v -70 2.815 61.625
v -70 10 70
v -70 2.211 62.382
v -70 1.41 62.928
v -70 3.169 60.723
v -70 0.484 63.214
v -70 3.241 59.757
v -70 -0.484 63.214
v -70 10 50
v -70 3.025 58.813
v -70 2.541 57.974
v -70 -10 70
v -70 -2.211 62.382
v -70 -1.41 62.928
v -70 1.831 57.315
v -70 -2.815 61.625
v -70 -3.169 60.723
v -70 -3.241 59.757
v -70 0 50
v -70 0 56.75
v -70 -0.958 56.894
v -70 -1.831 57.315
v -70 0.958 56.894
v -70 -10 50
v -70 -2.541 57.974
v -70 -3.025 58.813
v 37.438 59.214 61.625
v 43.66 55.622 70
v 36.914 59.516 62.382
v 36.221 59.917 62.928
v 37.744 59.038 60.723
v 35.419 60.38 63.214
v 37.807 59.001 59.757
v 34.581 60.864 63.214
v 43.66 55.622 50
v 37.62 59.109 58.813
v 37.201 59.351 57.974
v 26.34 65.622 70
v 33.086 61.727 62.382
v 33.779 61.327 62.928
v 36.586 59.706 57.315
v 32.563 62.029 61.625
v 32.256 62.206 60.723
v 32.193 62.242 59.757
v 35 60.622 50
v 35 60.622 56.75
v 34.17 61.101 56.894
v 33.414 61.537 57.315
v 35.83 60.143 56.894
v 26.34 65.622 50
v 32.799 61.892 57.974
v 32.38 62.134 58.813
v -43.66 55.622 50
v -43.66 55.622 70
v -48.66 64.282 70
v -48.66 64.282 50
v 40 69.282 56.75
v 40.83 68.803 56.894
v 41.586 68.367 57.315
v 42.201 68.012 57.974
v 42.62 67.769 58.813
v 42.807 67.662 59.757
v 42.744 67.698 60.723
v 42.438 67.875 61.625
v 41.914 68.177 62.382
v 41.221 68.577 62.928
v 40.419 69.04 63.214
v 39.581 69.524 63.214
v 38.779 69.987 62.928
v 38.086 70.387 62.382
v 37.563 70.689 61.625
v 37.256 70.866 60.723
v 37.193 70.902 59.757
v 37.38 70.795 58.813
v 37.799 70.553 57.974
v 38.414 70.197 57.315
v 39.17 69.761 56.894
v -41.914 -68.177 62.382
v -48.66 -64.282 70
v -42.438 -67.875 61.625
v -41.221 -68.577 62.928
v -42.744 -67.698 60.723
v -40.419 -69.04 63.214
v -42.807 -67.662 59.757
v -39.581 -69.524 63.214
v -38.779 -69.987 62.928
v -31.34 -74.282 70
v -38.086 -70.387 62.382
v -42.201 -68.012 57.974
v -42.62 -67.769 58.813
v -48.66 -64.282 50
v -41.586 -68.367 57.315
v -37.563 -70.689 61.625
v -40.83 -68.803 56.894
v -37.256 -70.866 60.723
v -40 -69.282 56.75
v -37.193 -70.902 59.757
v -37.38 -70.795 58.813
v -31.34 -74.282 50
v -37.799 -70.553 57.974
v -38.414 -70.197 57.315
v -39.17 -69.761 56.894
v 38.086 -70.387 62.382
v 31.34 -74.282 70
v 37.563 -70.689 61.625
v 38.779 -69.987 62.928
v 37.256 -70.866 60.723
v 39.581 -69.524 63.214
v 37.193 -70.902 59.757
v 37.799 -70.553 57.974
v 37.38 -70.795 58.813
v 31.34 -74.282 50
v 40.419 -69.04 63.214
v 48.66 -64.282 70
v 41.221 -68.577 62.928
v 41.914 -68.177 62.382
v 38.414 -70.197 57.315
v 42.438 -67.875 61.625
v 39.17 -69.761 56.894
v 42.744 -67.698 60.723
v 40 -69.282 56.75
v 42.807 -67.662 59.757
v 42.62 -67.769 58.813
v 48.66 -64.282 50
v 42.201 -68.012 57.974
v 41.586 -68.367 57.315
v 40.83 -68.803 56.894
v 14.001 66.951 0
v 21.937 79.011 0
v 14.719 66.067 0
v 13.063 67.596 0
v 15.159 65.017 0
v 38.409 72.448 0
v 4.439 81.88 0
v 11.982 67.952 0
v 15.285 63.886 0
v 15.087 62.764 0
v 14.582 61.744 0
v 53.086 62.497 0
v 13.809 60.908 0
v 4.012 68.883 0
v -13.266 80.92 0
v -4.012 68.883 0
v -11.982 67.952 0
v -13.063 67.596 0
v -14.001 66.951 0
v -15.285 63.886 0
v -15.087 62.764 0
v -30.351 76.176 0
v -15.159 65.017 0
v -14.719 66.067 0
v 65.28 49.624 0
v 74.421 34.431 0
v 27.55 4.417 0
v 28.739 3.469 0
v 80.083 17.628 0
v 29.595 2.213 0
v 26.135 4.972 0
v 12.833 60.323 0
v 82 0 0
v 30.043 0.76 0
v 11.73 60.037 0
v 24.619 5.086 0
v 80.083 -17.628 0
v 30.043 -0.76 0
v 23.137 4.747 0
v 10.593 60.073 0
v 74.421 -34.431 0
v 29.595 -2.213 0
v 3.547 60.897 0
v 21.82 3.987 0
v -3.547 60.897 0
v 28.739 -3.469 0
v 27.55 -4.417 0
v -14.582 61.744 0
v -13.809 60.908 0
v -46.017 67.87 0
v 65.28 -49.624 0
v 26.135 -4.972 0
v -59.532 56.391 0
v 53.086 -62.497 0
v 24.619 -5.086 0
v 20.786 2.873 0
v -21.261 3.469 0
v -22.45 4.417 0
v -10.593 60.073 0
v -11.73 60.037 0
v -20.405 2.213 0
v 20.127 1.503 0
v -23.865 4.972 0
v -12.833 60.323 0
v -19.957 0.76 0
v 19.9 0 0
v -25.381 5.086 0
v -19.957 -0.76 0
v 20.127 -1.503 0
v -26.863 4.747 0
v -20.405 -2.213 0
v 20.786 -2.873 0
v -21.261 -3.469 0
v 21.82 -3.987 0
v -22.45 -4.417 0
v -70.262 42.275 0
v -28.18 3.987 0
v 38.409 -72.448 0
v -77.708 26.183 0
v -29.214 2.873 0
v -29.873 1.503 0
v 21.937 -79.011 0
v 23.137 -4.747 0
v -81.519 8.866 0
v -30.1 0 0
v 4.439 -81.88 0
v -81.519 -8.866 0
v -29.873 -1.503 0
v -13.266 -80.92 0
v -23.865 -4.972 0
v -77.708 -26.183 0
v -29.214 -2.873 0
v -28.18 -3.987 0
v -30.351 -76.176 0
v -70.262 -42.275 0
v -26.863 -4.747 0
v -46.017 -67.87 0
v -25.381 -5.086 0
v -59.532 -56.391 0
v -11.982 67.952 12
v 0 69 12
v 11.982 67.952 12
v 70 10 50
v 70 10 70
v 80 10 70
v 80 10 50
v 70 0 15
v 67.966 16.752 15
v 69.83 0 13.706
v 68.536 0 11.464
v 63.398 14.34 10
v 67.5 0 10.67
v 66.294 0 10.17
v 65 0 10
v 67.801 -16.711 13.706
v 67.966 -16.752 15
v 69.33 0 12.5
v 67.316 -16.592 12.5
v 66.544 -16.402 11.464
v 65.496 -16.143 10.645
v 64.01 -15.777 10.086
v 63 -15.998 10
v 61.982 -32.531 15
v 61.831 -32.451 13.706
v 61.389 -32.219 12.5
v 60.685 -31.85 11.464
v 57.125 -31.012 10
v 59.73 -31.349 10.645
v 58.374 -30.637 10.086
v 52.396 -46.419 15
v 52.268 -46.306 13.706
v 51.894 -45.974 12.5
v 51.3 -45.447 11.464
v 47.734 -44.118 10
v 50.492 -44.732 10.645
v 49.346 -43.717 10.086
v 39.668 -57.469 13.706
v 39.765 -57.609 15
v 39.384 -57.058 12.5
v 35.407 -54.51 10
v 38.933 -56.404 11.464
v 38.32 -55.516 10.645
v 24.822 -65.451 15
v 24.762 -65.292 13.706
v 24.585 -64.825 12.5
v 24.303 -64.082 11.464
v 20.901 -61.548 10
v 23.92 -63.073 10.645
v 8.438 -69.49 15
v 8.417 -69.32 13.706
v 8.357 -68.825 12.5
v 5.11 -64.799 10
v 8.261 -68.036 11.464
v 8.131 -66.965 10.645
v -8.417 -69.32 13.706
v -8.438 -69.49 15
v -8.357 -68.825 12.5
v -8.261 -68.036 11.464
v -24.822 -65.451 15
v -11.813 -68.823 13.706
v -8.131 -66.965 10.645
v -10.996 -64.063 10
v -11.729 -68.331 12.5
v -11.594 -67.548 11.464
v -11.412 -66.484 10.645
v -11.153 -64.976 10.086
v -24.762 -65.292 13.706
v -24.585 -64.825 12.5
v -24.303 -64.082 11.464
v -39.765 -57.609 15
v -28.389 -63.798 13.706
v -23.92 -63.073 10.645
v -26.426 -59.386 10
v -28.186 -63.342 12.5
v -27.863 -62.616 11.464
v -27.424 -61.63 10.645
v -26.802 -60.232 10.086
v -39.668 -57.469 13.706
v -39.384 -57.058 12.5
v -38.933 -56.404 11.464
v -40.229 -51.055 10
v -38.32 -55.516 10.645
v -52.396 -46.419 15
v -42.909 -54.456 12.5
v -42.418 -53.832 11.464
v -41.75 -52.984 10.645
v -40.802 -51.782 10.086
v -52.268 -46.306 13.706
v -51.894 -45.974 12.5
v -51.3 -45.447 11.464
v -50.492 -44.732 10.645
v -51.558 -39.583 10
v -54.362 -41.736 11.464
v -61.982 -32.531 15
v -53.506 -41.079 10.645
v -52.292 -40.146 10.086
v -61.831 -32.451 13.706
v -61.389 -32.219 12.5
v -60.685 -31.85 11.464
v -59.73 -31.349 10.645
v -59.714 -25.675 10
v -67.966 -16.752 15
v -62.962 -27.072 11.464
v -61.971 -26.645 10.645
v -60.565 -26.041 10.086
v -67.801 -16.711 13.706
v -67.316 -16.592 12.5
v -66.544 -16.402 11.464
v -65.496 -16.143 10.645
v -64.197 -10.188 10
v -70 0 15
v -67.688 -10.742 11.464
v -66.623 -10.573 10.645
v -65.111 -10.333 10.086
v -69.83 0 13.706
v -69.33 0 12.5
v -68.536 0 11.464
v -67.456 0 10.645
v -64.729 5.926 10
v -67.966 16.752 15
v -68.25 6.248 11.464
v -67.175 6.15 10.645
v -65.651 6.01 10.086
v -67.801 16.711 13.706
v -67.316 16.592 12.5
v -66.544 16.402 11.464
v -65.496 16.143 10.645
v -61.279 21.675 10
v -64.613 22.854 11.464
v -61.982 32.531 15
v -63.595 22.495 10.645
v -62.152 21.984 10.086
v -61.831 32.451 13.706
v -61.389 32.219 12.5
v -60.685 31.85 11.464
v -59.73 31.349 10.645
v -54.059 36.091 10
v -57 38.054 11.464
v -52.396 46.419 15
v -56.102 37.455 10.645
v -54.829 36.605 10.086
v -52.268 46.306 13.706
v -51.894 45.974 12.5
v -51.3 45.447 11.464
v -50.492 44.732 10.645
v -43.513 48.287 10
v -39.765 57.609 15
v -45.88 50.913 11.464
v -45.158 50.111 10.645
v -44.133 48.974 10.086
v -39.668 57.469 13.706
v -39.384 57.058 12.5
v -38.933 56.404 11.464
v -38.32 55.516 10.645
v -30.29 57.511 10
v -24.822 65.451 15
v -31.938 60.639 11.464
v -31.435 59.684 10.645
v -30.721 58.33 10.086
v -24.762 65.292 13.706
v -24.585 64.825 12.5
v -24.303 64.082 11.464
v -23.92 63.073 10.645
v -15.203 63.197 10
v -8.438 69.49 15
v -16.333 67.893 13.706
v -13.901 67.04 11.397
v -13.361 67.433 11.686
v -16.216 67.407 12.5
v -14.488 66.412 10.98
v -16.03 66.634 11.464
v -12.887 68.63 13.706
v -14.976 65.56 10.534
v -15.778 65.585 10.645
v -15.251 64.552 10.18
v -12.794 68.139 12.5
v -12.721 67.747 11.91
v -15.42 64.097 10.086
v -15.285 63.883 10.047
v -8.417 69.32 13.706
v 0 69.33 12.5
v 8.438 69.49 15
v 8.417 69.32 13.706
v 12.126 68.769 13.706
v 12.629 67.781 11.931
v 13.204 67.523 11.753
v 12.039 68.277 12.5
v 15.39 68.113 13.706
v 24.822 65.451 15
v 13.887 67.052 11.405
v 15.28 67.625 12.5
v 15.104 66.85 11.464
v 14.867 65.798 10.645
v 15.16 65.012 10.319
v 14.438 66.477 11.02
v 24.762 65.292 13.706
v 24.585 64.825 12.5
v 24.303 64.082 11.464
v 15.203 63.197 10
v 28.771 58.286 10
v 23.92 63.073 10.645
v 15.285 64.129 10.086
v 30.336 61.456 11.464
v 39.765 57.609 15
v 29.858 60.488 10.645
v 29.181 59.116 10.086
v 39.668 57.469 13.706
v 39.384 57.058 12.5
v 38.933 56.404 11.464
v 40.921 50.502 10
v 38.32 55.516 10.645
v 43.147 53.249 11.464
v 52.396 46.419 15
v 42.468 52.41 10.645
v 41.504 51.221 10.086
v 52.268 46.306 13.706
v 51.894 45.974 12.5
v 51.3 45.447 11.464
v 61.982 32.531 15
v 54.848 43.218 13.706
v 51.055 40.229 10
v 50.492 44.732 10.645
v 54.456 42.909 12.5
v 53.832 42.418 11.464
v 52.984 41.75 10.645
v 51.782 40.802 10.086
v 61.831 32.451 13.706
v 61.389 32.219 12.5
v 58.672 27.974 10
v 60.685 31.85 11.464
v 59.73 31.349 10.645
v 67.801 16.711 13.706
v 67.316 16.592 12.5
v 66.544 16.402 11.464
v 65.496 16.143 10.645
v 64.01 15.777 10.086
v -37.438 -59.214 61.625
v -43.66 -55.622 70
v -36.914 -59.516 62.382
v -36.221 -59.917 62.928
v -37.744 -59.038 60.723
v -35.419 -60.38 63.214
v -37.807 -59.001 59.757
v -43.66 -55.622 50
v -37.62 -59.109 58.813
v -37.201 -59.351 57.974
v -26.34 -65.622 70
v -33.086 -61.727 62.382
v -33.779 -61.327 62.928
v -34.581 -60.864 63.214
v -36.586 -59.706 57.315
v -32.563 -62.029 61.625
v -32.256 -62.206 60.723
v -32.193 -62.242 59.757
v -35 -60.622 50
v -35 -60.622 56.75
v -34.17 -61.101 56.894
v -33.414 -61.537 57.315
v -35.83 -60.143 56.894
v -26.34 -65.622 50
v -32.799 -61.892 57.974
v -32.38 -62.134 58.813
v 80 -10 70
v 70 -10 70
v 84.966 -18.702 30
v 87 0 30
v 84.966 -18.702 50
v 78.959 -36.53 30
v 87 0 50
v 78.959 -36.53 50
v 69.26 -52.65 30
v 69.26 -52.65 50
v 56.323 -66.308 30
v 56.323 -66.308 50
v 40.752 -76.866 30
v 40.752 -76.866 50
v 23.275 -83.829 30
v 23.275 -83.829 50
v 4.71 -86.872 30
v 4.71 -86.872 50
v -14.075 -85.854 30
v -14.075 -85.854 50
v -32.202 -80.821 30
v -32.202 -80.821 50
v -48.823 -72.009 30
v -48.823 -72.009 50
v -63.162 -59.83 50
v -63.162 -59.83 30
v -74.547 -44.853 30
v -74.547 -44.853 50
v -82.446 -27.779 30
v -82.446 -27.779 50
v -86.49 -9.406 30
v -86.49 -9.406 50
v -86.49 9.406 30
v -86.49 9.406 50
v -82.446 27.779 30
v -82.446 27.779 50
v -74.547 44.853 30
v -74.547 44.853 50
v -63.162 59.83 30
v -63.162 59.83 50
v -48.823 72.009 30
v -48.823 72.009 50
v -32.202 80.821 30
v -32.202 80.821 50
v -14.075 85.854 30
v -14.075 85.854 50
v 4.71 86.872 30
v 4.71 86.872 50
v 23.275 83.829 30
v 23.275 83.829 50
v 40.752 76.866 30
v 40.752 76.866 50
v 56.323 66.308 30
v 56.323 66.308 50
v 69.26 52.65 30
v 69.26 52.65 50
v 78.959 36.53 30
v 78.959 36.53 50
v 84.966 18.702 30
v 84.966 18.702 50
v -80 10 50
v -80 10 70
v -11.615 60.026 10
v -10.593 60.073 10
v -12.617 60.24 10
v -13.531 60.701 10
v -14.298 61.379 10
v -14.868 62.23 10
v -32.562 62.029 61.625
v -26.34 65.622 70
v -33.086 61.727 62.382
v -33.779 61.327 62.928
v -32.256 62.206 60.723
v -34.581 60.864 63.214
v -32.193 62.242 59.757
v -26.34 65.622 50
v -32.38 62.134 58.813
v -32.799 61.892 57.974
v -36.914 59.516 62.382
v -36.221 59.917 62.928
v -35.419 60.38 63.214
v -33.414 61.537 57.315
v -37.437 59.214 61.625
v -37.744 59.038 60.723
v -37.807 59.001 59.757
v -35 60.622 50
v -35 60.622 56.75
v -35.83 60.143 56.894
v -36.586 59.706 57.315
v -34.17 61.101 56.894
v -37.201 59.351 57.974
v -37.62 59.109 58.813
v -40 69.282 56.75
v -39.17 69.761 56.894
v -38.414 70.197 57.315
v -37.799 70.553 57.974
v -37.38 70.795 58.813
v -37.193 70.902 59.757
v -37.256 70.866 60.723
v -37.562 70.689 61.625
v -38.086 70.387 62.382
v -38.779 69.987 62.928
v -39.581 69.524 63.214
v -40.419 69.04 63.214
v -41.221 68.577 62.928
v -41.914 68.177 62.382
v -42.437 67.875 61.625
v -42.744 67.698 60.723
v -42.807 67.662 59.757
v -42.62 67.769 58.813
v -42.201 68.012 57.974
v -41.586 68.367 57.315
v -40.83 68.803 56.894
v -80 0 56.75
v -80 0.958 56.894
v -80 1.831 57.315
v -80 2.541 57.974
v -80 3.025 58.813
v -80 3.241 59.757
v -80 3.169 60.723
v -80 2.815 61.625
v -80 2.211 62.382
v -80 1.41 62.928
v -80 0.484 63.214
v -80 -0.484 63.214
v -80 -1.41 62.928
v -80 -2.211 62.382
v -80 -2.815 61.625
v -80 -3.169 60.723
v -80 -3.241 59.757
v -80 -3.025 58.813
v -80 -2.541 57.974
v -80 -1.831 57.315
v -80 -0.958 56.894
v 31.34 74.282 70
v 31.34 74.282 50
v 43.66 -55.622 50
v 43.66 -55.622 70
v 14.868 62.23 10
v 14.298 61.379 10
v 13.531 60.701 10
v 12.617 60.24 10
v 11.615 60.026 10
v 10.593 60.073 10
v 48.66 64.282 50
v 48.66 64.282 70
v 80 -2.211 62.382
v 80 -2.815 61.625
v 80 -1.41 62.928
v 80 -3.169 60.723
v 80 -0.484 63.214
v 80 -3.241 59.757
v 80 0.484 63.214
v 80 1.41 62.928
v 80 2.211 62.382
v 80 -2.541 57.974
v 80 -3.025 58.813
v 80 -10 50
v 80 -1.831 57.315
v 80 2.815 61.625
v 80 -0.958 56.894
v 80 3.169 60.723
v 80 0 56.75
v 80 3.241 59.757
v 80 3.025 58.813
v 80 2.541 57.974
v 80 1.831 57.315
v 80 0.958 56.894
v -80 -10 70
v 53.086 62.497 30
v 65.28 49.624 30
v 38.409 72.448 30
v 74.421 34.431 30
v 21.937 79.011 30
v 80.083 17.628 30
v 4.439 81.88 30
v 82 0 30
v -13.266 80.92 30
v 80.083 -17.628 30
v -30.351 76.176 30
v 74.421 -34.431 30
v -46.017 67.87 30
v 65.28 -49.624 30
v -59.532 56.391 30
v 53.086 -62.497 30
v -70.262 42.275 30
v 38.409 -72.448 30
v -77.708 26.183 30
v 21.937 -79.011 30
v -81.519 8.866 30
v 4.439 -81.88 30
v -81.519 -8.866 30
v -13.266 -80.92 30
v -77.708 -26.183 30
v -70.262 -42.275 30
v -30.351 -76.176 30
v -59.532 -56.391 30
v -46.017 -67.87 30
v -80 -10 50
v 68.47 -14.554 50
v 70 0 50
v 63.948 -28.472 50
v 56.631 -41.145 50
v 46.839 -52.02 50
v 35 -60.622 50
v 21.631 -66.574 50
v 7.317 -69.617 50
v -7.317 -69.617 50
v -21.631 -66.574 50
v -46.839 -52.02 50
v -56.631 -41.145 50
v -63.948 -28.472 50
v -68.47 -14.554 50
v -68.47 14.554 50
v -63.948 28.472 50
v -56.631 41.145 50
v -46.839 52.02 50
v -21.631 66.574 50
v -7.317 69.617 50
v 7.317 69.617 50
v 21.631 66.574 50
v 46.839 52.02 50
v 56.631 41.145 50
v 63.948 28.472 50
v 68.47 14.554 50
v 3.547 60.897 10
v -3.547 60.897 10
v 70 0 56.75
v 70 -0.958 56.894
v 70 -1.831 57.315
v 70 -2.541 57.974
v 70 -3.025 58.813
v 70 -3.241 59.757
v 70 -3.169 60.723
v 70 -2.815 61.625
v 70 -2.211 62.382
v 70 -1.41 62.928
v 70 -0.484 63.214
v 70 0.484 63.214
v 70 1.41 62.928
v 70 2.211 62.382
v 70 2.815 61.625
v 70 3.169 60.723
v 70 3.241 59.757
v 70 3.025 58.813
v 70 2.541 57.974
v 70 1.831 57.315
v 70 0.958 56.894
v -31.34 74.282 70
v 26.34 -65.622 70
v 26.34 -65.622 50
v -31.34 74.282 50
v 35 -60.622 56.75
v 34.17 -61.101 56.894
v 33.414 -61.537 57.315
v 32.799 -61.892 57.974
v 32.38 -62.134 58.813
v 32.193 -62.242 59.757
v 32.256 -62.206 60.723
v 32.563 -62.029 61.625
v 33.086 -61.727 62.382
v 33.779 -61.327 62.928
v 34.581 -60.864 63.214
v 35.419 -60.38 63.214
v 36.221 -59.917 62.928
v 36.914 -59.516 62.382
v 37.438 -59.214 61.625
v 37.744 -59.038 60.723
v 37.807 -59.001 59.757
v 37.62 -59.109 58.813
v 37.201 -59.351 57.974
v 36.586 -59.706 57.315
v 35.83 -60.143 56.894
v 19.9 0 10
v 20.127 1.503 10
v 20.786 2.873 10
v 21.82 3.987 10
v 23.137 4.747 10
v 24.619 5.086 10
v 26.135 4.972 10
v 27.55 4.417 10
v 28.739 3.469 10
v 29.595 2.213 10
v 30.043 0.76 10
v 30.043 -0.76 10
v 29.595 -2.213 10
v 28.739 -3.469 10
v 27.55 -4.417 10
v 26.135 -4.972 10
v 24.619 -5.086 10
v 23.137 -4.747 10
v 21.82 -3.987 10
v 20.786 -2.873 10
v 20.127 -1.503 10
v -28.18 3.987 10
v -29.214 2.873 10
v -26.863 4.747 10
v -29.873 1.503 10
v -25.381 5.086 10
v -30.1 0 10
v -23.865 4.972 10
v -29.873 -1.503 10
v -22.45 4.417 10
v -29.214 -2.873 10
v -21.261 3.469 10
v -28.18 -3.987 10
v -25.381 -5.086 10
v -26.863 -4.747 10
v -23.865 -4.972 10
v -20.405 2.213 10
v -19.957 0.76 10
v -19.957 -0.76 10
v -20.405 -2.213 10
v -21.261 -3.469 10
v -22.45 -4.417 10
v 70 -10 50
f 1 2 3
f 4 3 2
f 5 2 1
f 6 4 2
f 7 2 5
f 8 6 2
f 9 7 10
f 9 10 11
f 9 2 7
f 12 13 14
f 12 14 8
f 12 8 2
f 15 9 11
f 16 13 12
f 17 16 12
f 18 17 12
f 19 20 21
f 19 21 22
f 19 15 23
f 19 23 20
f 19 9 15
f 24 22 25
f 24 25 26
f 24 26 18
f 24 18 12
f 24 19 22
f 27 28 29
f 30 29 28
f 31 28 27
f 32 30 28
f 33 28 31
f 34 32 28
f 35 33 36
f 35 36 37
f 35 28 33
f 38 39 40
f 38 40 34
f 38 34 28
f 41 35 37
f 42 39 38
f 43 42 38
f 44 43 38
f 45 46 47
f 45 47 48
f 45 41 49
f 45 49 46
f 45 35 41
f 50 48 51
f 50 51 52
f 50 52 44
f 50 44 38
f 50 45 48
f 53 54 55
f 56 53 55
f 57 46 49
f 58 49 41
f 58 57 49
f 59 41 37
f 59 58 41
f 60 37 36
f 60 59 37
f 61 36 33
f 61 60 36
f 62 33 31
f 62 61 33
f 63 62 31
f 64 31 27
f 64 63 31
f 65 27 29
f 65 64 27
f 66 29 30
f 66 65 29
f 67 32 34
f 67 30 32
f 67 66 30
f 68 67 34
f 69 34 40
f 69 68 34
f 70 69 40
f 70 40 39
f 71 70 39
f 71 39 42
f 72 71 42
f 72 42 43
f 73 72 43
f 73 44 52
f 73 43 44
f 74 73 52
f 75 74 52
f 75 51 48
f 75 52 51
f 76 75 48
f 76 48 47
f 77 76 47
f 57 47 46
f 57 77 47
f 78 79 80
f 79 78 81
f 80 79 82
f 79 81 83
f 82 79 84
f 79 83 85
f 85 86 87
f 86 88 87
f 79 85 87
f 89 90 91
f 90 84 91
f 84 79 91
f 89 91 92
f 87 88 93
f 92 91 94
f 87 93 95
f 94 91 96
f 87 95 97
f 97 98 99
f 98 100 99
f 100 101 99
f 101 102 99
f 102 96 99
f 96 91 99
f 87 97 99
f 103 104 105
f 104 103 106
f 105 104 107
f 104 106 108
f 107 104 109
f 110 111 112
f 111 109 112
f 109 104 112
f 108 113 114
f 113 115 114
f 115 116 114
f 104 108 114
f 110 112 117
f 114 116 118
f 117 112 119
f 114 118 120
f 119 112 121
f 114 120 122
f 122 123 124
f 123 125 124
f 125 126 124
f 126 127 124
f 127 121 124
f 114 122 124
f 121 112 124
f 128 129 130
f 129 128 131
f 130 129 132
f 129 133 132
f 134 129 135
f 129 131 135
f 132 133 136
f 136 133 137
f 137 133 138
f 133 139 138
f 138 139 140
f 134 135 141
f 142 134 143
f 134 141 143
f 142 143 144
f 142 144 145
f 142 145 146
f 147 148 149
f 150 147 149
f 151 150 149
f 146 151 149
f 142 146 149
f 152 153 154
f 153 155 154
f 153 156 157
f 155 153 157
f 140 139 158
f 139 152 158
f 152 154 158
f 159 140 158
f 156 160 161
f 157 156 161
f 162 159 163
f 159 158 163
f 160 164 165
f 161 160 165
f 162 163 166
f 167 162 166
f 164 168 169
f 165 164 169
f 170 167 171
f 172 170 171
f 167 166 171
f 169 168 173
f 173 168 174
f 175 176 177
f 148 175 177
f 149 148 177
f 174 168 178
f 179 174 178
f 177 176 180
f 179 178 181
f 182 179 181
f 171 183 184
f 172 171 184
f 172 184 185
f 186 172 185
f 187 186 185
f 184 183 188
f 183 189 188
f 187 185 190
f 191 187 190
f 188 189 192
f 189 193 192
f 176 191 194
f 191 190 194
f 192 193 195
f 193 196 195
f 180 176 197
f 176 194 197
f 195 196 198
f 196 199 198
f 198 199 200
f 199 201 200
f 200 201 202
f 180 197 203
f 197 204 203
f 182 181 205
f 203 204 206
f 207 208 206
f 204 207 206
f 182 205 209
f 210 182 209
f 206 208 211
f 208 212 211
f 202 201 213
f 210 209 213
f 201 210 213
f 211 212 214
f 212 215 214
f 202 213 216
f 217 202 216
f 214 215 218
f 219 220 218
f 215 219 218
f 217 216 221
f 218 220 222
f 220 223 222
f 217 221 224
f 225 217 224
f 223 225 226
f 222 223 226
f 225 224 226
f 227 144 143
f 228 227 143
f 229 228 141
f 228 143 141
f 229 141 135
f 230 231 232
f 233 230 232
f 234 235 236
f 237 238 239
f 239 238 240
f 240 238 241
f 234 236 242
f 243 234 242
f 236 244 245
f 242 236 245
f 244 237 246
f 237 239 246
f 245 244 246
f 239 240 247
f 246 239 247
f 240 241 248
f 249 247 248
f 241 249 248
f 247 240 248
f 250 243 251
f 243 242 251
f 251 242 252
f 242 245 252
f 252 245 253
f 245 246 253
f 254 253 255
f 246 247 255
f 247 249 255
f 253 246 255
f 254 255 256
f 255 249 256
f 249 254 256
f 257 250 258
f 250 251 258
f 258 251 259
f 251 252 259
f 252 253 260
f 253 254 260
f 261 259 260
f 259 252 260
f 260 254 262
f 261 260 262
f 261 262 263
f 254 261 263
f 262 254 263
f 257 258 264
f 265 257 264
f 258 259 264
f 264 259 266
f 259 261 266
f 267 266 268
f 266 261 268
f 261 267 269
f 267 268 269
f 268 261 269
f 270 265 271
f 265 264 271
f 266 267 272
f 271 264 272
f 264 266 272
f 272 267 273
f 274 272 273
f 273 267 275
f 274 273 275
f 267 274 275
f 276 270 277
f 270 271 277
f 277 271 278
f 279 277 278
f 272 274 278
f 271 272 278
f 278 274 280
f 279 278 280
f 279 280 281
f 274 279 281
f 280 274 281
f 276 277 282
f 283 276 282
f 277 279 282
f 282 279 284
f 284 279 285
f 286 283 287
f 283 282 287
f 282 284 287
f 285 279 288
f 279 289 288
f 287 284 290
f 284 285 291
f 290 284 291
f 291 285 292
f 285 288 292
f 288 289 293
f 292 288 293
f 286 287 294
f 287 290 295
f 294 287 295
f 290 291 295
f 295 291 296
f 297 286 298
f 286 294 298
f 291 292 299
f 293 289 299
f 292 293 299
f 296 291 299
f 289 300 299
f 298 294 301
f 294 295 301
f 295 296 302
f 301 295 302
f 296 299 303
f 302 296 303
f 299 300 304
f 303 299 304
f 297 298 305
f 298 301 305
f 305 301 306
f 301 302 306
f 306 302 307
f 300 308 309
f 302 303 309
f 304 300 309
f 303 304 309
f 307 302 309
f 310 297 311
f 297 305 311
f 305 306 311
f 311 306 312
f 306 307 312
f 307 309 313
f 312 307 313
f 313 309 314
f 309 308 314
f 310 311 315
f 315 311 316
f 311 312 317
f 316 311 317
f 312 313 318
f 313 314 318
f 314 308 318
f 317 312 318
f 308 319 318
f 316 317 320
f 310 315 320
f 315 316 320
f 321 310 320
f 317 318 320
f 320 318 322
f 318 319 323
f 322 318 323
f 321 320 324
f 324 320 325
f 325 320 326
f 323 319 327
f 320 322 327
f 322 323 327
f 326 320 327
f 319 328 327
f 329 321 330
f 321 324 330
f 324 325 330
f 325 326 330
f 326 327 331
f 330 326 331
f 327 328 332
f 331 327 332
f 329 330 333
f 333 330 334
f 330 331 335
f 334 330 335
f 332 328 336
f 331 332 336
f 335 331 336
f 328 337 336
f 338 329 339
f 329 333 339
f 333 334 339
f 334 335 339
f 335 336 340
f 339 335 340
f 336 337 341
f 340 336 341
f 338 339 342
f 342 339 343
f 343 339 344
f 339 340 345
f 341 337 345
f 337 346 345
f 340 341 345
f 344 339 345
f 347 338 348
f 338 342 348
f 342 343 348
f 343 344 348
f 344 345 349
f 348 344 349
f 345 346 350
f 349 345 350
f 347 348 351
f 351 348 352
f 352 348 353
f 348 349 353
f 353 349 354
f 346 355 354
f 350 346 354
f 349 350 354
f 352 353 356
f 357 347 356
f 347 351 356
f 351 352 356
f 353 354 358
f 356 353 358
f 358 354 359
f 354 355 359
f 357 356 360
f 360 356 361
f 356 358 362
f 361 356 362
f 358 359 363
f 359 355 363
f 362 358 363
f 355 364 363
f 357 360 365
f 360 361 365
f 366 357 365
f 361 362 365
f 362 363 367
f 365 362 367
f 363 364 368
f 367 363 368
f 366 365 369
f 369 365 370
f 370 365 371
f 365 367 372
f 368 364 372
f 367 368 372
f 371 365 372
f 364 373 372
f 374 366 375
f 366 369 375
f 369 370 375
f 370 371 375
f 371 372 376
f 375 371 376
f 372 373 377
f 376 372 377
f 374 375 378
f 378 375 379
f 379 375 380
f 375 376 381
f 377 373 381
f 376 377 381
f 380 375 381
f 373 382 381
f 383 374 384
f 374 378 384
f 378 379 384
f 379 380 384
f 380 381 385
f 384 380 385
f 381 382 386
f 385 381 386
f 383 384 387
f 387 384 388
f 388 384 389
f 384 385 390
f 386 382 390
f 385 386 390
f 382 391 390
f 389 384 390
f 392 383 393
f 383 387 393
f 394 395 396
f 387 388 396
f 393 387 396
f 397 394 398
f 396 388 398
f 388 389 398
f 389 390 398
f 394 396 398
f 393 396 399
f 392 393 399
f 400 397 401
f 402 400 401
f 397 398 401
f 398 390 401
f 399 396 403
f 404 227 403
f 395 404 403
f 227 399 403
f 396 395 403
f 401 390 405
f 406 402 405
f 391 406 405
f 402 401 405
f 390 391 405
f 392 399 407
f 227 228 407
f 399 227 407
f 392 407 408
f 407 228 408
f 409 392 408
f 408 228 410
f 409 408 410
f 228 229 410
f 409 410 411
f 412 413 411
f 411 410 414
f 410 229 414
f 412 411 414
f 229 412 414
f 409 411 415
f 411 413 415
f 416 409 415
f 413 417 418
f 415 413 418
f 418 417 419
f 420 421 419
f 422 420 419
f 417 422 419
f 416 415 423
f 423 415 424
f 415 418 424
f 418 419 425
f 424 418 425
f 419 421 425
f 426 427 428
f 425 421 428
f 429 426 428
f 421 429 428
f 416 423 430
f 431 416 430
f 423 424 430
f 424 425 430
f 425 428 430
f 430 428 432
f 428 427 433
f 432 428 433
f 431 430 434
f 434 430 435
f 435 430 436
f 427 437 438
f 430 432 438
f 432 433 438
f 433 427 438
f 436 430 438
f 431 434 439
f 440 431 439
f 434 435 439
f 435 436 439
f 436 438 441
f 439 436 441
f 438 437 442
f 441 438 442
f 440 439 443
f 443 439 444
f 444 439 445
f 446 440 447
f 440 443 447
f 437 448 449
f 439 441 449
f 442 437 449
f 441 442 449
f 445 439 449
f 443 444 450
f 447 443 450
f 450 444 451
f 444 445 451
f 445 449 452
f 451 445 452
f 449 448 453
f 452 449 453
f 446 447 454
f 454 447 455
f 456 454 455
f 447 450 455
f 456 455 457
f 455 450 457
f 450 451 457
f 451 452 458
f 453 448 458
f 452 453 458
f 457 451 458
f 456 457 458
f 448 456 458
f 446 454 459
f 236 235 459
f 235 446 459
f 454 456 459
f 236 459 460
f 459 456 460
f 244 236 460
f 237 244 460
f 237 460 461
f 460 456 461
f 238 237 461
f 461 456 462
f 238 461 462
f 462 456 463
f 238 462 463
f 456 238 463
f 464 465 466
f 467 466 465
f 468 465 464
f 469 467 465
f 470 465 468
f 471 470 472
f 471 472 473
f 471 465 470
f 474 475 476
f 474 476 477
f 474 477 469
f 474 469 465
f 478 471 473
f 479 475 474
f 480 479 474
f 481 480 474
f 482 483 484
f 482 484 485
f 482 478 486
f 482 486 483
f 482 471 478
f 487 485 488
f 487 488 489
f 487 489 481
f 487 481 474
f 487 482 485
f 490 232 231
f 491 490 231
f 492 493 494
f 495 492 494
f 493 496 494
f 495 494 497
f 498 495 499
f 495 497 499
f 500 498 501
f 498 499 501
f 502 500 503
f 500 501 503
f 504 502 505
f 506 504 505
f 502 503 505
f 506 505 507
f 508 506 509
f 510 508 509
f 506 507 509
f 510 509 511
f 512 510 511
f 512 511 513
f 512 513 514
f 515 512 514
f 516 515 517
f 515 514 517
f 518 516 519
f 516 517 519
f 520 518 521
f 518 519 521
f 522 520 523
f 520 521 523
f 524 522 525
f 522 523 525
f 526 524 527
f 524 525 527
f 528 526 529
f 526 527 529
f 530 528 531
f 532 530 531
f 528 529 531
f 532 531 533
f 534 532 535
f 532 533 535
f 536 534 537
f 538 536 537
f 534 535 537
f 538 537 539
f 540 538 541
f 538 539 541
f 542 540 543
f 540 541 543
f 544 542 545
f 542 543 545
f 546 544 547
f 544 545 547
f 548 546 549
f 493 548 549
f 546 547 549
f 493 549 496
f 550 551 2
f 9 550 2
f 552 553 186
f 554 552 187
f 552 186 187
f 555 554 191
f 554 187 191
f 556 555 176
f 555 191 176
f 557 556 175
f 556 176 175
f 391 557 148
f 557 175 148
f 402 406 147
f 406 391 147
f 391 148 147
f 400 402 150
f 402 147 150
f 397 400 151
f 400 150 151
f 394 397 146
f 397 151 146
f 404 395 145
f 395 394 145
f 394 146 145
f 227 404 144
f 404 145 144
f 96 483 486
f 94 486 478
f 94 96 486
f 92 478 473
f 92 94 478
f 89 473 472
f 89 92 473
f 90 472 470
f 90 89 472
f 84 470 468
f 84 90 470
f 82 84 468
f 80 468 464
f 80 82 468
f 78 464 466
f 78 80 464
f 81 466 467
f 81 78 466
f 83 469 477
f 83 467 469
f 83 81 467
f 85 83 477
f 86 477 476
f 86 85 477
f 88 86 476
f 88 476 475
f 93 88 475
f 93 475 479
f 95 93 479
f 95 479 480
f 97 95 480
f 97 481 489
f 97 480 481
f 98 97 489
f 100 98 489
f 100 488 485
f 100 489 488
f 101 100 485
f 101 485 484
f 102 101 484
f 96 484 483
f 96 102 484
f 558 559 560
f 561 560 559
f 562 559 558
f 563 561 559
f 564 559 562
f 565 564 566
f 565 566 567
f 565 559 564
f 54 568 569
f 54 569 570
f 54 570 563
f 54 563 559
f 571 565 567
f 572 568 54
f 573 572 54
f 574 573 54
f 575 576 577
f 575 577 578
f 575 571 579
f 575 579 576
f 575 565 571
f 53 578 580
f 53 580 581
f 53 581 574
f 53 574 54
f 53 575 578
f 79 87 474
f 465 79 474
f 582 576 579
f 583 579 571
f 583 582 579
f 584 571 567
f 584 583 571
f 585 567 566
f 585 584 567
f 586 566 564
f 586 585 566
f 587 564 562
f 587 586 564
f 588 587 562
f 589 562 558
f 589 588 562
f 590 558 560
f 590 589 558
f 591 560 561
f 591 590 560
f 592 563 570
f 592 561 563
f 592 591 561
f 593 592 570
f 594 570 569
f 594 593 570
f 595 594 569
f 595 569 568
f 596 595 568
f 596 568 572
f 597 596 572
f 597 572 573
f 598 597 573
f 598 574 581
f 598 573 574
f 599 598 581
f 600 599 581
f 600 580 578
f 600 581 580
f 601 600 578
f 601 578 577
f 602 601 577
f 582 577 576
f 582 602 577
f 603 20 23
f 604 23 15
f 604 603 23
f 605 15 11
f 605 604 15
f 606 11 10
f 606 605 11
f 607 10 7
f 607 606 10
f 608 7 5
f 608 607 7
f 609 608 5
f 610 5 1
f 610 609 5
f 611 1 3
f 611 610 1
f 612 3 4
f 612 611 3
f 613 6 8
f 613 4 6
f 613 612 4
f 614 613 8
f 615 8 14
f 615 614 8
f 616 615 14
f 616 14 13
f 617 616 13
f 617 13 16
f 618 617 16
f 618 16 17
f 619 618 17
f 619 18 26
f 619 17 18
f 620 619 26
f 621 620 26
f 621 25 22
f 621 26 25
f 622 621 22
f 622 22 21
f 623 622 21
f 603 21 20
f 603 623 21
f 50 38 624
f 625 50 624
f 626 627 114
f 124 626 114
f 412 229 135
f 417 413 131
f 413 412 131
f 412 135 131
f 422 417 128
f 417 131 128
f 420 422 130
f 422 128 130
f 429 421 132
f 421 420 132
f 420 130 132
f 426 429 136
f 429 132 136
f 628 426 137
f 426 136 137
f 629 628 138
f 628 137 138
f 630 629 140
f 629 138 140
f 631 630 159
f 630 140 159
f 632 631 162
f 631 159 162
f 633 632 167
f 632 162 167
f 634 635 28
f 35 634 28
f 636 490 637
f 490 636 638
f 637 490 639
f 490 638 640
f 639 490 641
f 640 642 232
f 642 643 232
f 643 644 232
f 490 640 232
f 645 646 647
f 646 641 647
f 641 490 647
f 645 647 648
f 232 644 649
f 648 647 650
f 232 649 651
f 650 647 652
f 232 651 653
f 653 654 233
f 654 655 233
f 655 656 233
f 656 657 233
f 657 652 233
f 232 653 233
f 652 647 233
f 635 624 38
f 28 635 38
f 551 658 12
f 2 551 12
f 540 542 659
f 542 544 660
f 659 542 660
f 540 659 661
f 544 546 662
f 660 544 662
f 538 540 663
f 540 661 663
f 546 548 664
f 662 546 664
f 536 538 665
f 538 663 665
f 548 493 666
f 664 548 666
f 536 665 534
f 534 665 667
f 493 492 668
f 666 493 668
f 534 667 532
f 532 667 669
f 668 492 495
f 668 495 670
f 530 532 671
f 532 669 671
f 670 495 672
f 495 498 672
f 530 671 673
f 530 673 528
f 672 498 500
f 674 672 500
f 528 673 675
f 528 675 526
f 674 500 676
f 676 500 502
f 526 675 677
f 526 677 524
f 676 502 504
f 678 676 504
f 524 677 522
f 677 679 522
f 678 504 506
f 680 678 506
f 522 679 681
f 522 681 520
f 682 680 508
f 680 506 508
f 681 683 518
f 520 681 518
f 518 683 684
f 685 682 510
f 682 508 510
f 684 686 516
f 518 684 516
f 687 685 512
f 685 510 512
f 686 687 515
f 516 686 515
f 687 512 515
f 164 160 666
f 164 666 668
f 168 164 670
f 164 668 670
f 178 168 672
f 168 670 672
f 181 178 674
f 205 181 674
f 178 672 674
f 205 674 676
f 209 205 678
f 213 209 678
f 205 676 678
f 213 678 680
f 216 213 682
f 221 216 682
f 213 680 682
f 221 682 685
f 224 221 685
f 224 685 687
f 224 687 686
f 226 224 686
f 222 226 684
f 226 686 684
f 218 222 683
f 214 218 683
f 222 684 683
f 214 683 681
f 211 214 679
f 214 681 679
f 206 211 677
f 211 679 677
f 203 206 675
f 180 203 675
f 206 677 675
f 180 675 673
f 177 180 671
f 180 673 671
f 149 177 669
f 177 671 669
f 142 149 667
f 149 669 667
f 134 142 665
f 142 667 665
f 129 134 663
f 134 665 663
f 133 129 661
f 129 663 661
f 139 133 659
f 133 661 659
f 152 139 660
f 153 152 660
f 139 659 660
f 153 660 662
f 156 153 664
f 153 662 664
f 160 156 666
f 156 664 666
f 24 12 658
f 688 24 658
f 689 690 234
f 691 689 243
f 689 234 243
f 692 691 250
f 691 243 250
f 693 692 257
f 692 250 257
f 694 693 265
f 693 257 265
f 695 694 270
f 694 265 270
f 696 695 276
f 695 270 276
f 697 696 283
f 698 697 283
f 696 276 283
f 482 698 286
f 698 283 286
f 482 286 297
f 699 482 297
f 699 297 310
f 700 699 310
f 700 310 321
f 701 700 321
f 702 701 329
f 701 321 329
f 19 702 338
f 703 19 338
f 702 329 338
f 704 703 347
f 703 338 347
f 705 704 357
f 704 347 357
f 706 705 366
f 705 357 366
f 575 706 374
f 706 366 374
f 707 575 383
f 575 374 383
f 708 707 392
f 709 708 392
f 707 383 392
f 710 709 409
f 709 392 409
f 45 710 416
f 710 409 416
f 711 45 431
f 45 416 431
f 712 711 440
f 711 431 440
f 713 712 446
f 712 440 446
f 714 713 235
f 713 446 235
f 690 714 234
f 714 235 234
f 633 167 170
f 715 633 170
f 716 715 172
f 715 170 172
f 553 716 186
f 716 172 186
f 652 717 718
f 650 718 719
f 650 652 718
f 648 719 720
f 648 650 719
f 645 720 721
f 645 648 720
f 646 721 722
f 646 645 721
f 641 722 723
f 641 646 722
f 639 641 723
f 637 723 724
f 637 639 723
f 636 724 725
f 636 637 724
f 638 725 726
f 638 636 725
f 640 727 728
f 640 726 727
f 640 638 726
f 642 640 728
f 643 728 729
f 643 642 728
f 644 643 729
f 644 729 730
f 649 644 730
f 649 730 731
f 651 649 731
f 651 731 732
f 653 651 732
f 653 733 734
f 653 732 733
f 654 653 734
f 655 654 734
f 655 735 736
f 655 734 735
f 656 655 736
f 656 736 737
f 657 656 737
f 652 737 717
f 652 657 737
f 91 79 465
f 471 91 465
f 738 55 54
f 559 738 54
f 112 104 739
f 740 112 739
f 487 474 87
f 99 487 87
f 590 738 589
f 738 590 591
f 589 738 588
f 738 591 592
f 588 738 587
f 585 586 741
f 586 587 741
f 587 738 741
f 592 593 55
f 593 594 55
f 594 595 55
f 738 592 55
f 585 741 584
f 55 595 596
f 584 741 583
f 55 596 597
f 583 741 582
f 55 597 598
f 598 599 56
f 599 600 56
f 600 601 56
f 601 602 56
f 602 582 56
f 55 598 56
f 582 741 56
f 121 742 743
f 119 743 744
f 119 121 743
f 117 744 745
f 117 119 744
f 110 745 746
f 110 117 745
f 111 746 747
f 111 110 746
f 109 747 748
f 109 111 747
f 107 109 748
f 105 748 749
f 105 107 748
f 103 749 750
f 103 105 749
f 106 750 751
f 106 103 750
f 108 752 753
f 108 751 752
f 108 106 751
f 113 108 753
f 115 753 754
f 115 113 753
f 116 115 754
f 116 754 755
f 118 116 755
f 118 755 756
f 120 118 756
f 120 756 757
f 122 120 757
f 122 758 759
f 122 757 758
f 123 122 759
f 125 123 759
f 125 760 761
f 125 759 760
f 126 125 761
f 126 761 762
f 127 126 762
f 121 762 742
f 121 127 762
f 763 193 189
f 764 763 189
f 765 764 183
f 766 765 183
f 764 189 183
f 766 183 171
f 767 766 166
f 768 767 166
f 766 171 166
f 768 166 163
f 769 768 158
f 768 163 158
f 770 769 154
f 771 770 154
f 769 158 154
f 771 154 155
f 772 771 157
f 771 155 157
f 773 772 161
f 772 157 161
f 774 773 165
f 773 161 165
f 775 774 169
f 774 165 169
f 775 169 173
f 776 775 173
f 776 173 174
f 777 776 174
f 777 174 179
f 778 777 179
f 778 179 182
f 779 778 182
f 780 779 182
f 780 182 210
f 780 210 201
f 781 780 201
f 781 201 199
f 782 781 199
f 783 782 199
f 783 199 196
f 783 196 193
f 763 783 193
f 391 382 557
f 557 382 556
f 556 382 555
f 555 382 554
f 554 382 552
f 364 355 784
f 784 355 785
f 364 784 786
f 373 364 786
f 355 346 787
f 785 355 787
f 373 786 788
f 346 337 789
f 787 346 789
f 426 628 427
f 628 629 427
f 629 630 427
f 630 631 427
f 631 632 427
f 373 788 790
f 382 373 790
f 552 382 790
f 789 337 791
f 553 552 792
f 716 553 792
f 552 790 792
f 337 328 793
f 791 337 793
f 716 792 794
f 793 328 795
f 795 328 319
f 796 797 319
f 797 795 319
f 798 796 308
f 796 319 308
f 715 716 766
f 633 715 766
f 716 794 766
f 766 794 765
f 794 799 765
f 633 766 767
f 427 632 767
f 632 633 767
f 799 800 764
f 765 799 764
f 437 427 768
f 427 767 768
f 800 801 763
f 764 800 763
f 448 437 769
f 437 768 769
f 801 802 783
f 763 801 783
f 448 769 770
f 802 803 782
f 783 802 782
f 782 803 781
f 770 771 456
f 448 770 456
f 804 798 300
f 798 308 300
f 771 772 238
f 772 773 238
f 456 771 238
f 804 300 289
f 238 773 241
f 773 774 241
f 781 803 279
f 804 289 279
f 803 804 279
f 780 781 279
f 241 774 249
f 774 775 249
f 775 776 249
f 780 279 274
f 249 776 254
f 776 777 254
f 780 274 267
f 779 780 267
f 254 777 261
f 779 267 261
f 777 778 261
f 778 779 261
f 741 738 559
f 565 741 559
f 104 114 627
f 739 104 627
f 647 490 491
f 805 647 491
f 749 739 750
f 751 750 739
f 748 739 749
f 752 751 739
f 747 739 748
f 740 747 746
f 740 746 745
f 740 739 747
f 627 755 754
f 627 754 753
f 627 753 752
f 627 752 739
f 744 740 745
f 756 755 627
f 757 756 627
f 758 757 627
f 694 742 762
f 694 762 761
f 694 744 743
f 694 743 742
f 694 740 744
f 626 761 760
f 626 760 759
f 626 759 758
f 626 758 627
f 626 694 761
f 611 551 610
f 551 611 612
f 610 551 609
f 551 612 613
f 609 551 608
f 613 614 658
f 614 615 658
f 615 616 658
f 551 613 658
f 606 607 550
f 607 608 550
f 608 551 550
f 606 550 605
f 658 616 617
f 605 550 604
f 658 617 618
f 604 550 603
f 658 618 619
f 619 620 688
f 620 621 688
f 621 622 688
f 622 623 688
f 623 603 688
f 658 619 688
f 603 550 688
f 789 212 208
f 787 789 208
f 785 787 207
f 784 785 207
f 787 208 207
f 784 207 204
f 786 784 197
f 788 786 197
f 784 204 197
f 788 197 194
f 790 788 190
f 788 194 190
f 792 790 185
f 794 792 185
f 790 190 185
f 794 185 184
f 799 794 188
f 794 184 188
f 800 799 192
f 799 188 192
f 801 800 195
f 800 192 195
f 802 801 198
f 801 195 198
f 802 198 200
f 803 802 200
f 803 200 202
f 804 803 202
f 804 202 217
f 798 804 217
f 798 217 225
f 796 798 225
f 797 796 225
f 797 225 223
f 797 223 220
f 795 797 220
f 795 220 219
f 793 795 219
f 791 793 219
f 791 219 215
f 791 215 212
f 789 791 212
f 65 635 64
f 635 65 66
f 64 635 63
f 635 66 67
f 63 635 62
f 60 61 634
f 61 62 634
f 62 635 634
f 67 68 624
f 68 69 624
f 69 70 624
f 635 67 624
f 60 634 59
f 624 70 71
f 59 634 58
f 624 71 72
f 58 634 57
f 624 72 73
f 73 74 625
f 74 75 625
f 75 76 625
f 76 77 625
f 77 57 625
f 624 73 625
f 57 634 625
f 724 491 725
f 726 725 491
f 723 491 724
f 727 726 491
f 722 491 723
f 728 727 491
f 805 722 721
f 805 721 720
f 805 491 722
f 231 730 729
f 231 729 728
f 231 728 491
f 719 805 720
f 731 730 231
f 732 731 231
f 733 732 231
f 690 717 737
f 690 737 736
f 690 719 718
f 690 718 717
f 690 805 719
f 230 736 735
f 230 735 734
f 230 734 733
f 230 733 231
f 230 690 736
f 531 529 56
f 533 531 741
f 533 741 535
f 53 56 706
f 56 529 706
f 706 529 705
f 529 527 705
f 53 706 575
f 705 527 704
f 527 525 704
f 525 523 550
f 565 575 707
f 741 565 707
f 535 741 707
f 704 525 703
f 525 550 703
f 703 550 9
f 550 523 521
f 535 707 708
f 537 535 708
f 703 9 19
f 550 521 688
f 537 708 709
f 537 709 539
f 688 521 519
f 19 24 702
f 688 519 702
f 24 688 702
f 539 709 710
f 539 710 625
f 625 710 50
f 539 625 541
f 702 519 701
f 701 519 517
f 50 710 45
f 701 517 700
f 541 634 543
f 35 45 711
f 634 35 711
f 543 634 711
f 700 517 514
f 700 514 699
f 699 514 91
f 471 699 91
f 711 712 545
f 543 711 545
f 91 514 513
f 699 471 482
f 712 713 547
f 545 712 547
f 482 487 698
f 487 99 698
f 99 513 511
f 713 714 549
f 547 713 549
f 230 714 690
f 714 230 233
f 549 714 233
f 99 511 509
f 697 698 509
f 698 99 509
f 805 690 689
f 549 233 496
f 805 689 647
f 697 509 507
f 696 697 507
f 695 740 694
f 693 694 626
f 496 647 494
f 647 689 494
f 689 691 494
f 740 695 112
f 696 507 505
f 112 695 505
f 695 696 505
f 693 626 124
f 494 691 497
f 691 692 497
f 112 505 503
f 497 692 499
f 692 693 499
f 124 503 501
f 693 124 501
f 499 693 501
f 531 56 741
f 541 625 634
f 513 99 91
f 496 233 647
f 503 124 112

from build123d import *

# Parameters (mm, degrees)
CUT_EXTRUDE1_REACH  = 134.808
SKETCH3_R           = 5.1
BOSS_EXTRUDE3_DEPTH = 20
CUT_EXTRUDE2_REACH  = 202.893
SKETCH6_R           = 3.25
CIRPATTERN1_COUNT   = 6


with BuildPart() as part:
    # Sketch1 → Revolve1 (revolve)
    with BuildSketch(Plane(origin=(0, 0, 0), x_dir=(1, 0, 0), z_dir=(0, 1, 0))):
        with BuildLine():
            Line((0, 0), (82, 0))
            Line((82, 0), (82, -30))
            Line((82, -30), (87, -30))
            Line((87, -30), (87, -50))
            Line((87, -50), (70, -50))
            Line((70, -50), (70, -15))
            ThreePointArc((70, -15), (68.535533906, -11.464466094), (65, -10))
            Line((65, -10), (0, -10))
            Line((0, -10), (0, 0))
        make_face()
    revolve(axis=Axis((0, 0, 0), (0, 0, -1)))

    # Sketch3 → Cut-Extrude1 (cut, up to next)
    with BuildSketch(Plane(origin=(0, 0, 0), x_dir=(-1, 0, 0), z_dir=(0, 0, -1)), mode=Mode.PRIVATE) as cut_extrude1_sk1:
        with Locations((-25, 0)):
            Circle(SKETCH3_R)
    cut_extrude1_tool1 = extrude(cut_extrude1_sk1.sketch, amount=-CUT_EXTRUDE1_REACH, mode=Mode.PRIVATE) & part.part
    # Sketch3 → Cut-Extrude1 (cut, up to next)
    with BuildSketch(Plane(origin=(0, 0, 0), x_dir=(-1, 0, 0), z_dir=(0, 0, -1)), mode=Mode.PRIVATE) as cut_extrude1_sk2:
        with Locations((25, 0)):
            Circle(SKETCH3_R)
    cut_extrude1_tool2 = extrude(cut_extrude1_sk2.sketch, amount=-CUT_EXTRUDE1_REACH, mode=Mode.PRIVATE) & part.part
    # Sketch3 → Cut-Extrude1 (cut, up to next)
    with BuildSketch(Plane(origin=(0, 0, 0), x_dir=(-1, 0, 0), z_dir=(0, 0, -1)), mode=Mode.PRIVATE) as cut_extrude1_sk3:
        with BuildLine():
            ThreePointArc((10.592538838, 60.073272934), (15.22636256, 63.317911235), (11.981724259, 67.951734958))
            ThreePointArc((11.981724259, 67.951734958), (0, 69), (-11.981724259, 67.951734958))
            ThreePointArc((-11.981724259, 67.951734958), (-15.22636256, 63.317911235), (-10.592538838, 60.073272934))
            ThreePointArc((-10.592538838, 60.073272934), (0, 61), (10.592538838, 60.073272934))
        make_face()
    cut_extrude1_tool3 = extrude(cut_extrude1_sk3.sketch, amount=-CUT_EXTRUDE1_REACH, mode=Mode.PRIVATE) & part.part
    add(cut_extrude1_tool1.solids().sort_by_distance((25, 0, 0))[0], mode=Mode.SUBTRACT)
    add(cut_extrude1_tool2.solids().sort_by_distance((-25, 0, 0))[0], mode=Mode.SUBTRACT)
    add(cut_extrude1_tool3.solids().sort_by_distance((0, 64.527802, 0))[0], mode=Mode.SUBTRACT)

    # Sketch5 → Boss-Extrude3 (add)
    with BuildSketch(Plane.XY.offset(50)):
        Polygon((80, 10), (80, 0), (80, -10), (70, -10), (70, 10), align=None)
    boss_extrude3 = extrude(amount=BOSS_EXTRUDE3_DEPTH)

    # Sketch6 → Cut-Extrude2 (cut, up to next)
    with BuildSketch(Plane(origin=(80, 0, 0), x_dir=(0, 1, 0), z_dir=(-1, 0, 0)), mode=Mode.PRIVATE) as cut_extrude2_sk1:
        with Locations(Location((0, -60, 0), (0, 0, 90))):
            Circle(SKETCH6_R)
    cut_extrude2_tool1 = extrude(cut_extrude2_sk1.sketch, amount=CUT_EXTRUDE2_REACH, mode=Mode.PRIVATE) & part.part
    cut_extrude2 = cut_extrude2_tool1.solids().sort_by_distance((80, 0, 60))[0]
    add(cut_extrude2, mode=Mode.SUBTRACT)

    # CirPattern1: Boss-Extrude3, Cut-Extrude2 ×6 about axis
    cirpattern1_axis = Axis((0, 0, 0), (0, 0, 1))
    add([boss_extrude3.rotate(cirpattern1_axis, i * 360 / CIRPATTERN1_COUNT) for i in range(1, CIRPATTERN1_COUNT)])
    add([cut_extrude2.rotate(cirpattern1_axis, i * 360 / CIRPATTERN1_COUNT) for i in range(1, CIRPATTERN1_COUNT)], mode=Mode.SUBTRACT)


solid = part.part
